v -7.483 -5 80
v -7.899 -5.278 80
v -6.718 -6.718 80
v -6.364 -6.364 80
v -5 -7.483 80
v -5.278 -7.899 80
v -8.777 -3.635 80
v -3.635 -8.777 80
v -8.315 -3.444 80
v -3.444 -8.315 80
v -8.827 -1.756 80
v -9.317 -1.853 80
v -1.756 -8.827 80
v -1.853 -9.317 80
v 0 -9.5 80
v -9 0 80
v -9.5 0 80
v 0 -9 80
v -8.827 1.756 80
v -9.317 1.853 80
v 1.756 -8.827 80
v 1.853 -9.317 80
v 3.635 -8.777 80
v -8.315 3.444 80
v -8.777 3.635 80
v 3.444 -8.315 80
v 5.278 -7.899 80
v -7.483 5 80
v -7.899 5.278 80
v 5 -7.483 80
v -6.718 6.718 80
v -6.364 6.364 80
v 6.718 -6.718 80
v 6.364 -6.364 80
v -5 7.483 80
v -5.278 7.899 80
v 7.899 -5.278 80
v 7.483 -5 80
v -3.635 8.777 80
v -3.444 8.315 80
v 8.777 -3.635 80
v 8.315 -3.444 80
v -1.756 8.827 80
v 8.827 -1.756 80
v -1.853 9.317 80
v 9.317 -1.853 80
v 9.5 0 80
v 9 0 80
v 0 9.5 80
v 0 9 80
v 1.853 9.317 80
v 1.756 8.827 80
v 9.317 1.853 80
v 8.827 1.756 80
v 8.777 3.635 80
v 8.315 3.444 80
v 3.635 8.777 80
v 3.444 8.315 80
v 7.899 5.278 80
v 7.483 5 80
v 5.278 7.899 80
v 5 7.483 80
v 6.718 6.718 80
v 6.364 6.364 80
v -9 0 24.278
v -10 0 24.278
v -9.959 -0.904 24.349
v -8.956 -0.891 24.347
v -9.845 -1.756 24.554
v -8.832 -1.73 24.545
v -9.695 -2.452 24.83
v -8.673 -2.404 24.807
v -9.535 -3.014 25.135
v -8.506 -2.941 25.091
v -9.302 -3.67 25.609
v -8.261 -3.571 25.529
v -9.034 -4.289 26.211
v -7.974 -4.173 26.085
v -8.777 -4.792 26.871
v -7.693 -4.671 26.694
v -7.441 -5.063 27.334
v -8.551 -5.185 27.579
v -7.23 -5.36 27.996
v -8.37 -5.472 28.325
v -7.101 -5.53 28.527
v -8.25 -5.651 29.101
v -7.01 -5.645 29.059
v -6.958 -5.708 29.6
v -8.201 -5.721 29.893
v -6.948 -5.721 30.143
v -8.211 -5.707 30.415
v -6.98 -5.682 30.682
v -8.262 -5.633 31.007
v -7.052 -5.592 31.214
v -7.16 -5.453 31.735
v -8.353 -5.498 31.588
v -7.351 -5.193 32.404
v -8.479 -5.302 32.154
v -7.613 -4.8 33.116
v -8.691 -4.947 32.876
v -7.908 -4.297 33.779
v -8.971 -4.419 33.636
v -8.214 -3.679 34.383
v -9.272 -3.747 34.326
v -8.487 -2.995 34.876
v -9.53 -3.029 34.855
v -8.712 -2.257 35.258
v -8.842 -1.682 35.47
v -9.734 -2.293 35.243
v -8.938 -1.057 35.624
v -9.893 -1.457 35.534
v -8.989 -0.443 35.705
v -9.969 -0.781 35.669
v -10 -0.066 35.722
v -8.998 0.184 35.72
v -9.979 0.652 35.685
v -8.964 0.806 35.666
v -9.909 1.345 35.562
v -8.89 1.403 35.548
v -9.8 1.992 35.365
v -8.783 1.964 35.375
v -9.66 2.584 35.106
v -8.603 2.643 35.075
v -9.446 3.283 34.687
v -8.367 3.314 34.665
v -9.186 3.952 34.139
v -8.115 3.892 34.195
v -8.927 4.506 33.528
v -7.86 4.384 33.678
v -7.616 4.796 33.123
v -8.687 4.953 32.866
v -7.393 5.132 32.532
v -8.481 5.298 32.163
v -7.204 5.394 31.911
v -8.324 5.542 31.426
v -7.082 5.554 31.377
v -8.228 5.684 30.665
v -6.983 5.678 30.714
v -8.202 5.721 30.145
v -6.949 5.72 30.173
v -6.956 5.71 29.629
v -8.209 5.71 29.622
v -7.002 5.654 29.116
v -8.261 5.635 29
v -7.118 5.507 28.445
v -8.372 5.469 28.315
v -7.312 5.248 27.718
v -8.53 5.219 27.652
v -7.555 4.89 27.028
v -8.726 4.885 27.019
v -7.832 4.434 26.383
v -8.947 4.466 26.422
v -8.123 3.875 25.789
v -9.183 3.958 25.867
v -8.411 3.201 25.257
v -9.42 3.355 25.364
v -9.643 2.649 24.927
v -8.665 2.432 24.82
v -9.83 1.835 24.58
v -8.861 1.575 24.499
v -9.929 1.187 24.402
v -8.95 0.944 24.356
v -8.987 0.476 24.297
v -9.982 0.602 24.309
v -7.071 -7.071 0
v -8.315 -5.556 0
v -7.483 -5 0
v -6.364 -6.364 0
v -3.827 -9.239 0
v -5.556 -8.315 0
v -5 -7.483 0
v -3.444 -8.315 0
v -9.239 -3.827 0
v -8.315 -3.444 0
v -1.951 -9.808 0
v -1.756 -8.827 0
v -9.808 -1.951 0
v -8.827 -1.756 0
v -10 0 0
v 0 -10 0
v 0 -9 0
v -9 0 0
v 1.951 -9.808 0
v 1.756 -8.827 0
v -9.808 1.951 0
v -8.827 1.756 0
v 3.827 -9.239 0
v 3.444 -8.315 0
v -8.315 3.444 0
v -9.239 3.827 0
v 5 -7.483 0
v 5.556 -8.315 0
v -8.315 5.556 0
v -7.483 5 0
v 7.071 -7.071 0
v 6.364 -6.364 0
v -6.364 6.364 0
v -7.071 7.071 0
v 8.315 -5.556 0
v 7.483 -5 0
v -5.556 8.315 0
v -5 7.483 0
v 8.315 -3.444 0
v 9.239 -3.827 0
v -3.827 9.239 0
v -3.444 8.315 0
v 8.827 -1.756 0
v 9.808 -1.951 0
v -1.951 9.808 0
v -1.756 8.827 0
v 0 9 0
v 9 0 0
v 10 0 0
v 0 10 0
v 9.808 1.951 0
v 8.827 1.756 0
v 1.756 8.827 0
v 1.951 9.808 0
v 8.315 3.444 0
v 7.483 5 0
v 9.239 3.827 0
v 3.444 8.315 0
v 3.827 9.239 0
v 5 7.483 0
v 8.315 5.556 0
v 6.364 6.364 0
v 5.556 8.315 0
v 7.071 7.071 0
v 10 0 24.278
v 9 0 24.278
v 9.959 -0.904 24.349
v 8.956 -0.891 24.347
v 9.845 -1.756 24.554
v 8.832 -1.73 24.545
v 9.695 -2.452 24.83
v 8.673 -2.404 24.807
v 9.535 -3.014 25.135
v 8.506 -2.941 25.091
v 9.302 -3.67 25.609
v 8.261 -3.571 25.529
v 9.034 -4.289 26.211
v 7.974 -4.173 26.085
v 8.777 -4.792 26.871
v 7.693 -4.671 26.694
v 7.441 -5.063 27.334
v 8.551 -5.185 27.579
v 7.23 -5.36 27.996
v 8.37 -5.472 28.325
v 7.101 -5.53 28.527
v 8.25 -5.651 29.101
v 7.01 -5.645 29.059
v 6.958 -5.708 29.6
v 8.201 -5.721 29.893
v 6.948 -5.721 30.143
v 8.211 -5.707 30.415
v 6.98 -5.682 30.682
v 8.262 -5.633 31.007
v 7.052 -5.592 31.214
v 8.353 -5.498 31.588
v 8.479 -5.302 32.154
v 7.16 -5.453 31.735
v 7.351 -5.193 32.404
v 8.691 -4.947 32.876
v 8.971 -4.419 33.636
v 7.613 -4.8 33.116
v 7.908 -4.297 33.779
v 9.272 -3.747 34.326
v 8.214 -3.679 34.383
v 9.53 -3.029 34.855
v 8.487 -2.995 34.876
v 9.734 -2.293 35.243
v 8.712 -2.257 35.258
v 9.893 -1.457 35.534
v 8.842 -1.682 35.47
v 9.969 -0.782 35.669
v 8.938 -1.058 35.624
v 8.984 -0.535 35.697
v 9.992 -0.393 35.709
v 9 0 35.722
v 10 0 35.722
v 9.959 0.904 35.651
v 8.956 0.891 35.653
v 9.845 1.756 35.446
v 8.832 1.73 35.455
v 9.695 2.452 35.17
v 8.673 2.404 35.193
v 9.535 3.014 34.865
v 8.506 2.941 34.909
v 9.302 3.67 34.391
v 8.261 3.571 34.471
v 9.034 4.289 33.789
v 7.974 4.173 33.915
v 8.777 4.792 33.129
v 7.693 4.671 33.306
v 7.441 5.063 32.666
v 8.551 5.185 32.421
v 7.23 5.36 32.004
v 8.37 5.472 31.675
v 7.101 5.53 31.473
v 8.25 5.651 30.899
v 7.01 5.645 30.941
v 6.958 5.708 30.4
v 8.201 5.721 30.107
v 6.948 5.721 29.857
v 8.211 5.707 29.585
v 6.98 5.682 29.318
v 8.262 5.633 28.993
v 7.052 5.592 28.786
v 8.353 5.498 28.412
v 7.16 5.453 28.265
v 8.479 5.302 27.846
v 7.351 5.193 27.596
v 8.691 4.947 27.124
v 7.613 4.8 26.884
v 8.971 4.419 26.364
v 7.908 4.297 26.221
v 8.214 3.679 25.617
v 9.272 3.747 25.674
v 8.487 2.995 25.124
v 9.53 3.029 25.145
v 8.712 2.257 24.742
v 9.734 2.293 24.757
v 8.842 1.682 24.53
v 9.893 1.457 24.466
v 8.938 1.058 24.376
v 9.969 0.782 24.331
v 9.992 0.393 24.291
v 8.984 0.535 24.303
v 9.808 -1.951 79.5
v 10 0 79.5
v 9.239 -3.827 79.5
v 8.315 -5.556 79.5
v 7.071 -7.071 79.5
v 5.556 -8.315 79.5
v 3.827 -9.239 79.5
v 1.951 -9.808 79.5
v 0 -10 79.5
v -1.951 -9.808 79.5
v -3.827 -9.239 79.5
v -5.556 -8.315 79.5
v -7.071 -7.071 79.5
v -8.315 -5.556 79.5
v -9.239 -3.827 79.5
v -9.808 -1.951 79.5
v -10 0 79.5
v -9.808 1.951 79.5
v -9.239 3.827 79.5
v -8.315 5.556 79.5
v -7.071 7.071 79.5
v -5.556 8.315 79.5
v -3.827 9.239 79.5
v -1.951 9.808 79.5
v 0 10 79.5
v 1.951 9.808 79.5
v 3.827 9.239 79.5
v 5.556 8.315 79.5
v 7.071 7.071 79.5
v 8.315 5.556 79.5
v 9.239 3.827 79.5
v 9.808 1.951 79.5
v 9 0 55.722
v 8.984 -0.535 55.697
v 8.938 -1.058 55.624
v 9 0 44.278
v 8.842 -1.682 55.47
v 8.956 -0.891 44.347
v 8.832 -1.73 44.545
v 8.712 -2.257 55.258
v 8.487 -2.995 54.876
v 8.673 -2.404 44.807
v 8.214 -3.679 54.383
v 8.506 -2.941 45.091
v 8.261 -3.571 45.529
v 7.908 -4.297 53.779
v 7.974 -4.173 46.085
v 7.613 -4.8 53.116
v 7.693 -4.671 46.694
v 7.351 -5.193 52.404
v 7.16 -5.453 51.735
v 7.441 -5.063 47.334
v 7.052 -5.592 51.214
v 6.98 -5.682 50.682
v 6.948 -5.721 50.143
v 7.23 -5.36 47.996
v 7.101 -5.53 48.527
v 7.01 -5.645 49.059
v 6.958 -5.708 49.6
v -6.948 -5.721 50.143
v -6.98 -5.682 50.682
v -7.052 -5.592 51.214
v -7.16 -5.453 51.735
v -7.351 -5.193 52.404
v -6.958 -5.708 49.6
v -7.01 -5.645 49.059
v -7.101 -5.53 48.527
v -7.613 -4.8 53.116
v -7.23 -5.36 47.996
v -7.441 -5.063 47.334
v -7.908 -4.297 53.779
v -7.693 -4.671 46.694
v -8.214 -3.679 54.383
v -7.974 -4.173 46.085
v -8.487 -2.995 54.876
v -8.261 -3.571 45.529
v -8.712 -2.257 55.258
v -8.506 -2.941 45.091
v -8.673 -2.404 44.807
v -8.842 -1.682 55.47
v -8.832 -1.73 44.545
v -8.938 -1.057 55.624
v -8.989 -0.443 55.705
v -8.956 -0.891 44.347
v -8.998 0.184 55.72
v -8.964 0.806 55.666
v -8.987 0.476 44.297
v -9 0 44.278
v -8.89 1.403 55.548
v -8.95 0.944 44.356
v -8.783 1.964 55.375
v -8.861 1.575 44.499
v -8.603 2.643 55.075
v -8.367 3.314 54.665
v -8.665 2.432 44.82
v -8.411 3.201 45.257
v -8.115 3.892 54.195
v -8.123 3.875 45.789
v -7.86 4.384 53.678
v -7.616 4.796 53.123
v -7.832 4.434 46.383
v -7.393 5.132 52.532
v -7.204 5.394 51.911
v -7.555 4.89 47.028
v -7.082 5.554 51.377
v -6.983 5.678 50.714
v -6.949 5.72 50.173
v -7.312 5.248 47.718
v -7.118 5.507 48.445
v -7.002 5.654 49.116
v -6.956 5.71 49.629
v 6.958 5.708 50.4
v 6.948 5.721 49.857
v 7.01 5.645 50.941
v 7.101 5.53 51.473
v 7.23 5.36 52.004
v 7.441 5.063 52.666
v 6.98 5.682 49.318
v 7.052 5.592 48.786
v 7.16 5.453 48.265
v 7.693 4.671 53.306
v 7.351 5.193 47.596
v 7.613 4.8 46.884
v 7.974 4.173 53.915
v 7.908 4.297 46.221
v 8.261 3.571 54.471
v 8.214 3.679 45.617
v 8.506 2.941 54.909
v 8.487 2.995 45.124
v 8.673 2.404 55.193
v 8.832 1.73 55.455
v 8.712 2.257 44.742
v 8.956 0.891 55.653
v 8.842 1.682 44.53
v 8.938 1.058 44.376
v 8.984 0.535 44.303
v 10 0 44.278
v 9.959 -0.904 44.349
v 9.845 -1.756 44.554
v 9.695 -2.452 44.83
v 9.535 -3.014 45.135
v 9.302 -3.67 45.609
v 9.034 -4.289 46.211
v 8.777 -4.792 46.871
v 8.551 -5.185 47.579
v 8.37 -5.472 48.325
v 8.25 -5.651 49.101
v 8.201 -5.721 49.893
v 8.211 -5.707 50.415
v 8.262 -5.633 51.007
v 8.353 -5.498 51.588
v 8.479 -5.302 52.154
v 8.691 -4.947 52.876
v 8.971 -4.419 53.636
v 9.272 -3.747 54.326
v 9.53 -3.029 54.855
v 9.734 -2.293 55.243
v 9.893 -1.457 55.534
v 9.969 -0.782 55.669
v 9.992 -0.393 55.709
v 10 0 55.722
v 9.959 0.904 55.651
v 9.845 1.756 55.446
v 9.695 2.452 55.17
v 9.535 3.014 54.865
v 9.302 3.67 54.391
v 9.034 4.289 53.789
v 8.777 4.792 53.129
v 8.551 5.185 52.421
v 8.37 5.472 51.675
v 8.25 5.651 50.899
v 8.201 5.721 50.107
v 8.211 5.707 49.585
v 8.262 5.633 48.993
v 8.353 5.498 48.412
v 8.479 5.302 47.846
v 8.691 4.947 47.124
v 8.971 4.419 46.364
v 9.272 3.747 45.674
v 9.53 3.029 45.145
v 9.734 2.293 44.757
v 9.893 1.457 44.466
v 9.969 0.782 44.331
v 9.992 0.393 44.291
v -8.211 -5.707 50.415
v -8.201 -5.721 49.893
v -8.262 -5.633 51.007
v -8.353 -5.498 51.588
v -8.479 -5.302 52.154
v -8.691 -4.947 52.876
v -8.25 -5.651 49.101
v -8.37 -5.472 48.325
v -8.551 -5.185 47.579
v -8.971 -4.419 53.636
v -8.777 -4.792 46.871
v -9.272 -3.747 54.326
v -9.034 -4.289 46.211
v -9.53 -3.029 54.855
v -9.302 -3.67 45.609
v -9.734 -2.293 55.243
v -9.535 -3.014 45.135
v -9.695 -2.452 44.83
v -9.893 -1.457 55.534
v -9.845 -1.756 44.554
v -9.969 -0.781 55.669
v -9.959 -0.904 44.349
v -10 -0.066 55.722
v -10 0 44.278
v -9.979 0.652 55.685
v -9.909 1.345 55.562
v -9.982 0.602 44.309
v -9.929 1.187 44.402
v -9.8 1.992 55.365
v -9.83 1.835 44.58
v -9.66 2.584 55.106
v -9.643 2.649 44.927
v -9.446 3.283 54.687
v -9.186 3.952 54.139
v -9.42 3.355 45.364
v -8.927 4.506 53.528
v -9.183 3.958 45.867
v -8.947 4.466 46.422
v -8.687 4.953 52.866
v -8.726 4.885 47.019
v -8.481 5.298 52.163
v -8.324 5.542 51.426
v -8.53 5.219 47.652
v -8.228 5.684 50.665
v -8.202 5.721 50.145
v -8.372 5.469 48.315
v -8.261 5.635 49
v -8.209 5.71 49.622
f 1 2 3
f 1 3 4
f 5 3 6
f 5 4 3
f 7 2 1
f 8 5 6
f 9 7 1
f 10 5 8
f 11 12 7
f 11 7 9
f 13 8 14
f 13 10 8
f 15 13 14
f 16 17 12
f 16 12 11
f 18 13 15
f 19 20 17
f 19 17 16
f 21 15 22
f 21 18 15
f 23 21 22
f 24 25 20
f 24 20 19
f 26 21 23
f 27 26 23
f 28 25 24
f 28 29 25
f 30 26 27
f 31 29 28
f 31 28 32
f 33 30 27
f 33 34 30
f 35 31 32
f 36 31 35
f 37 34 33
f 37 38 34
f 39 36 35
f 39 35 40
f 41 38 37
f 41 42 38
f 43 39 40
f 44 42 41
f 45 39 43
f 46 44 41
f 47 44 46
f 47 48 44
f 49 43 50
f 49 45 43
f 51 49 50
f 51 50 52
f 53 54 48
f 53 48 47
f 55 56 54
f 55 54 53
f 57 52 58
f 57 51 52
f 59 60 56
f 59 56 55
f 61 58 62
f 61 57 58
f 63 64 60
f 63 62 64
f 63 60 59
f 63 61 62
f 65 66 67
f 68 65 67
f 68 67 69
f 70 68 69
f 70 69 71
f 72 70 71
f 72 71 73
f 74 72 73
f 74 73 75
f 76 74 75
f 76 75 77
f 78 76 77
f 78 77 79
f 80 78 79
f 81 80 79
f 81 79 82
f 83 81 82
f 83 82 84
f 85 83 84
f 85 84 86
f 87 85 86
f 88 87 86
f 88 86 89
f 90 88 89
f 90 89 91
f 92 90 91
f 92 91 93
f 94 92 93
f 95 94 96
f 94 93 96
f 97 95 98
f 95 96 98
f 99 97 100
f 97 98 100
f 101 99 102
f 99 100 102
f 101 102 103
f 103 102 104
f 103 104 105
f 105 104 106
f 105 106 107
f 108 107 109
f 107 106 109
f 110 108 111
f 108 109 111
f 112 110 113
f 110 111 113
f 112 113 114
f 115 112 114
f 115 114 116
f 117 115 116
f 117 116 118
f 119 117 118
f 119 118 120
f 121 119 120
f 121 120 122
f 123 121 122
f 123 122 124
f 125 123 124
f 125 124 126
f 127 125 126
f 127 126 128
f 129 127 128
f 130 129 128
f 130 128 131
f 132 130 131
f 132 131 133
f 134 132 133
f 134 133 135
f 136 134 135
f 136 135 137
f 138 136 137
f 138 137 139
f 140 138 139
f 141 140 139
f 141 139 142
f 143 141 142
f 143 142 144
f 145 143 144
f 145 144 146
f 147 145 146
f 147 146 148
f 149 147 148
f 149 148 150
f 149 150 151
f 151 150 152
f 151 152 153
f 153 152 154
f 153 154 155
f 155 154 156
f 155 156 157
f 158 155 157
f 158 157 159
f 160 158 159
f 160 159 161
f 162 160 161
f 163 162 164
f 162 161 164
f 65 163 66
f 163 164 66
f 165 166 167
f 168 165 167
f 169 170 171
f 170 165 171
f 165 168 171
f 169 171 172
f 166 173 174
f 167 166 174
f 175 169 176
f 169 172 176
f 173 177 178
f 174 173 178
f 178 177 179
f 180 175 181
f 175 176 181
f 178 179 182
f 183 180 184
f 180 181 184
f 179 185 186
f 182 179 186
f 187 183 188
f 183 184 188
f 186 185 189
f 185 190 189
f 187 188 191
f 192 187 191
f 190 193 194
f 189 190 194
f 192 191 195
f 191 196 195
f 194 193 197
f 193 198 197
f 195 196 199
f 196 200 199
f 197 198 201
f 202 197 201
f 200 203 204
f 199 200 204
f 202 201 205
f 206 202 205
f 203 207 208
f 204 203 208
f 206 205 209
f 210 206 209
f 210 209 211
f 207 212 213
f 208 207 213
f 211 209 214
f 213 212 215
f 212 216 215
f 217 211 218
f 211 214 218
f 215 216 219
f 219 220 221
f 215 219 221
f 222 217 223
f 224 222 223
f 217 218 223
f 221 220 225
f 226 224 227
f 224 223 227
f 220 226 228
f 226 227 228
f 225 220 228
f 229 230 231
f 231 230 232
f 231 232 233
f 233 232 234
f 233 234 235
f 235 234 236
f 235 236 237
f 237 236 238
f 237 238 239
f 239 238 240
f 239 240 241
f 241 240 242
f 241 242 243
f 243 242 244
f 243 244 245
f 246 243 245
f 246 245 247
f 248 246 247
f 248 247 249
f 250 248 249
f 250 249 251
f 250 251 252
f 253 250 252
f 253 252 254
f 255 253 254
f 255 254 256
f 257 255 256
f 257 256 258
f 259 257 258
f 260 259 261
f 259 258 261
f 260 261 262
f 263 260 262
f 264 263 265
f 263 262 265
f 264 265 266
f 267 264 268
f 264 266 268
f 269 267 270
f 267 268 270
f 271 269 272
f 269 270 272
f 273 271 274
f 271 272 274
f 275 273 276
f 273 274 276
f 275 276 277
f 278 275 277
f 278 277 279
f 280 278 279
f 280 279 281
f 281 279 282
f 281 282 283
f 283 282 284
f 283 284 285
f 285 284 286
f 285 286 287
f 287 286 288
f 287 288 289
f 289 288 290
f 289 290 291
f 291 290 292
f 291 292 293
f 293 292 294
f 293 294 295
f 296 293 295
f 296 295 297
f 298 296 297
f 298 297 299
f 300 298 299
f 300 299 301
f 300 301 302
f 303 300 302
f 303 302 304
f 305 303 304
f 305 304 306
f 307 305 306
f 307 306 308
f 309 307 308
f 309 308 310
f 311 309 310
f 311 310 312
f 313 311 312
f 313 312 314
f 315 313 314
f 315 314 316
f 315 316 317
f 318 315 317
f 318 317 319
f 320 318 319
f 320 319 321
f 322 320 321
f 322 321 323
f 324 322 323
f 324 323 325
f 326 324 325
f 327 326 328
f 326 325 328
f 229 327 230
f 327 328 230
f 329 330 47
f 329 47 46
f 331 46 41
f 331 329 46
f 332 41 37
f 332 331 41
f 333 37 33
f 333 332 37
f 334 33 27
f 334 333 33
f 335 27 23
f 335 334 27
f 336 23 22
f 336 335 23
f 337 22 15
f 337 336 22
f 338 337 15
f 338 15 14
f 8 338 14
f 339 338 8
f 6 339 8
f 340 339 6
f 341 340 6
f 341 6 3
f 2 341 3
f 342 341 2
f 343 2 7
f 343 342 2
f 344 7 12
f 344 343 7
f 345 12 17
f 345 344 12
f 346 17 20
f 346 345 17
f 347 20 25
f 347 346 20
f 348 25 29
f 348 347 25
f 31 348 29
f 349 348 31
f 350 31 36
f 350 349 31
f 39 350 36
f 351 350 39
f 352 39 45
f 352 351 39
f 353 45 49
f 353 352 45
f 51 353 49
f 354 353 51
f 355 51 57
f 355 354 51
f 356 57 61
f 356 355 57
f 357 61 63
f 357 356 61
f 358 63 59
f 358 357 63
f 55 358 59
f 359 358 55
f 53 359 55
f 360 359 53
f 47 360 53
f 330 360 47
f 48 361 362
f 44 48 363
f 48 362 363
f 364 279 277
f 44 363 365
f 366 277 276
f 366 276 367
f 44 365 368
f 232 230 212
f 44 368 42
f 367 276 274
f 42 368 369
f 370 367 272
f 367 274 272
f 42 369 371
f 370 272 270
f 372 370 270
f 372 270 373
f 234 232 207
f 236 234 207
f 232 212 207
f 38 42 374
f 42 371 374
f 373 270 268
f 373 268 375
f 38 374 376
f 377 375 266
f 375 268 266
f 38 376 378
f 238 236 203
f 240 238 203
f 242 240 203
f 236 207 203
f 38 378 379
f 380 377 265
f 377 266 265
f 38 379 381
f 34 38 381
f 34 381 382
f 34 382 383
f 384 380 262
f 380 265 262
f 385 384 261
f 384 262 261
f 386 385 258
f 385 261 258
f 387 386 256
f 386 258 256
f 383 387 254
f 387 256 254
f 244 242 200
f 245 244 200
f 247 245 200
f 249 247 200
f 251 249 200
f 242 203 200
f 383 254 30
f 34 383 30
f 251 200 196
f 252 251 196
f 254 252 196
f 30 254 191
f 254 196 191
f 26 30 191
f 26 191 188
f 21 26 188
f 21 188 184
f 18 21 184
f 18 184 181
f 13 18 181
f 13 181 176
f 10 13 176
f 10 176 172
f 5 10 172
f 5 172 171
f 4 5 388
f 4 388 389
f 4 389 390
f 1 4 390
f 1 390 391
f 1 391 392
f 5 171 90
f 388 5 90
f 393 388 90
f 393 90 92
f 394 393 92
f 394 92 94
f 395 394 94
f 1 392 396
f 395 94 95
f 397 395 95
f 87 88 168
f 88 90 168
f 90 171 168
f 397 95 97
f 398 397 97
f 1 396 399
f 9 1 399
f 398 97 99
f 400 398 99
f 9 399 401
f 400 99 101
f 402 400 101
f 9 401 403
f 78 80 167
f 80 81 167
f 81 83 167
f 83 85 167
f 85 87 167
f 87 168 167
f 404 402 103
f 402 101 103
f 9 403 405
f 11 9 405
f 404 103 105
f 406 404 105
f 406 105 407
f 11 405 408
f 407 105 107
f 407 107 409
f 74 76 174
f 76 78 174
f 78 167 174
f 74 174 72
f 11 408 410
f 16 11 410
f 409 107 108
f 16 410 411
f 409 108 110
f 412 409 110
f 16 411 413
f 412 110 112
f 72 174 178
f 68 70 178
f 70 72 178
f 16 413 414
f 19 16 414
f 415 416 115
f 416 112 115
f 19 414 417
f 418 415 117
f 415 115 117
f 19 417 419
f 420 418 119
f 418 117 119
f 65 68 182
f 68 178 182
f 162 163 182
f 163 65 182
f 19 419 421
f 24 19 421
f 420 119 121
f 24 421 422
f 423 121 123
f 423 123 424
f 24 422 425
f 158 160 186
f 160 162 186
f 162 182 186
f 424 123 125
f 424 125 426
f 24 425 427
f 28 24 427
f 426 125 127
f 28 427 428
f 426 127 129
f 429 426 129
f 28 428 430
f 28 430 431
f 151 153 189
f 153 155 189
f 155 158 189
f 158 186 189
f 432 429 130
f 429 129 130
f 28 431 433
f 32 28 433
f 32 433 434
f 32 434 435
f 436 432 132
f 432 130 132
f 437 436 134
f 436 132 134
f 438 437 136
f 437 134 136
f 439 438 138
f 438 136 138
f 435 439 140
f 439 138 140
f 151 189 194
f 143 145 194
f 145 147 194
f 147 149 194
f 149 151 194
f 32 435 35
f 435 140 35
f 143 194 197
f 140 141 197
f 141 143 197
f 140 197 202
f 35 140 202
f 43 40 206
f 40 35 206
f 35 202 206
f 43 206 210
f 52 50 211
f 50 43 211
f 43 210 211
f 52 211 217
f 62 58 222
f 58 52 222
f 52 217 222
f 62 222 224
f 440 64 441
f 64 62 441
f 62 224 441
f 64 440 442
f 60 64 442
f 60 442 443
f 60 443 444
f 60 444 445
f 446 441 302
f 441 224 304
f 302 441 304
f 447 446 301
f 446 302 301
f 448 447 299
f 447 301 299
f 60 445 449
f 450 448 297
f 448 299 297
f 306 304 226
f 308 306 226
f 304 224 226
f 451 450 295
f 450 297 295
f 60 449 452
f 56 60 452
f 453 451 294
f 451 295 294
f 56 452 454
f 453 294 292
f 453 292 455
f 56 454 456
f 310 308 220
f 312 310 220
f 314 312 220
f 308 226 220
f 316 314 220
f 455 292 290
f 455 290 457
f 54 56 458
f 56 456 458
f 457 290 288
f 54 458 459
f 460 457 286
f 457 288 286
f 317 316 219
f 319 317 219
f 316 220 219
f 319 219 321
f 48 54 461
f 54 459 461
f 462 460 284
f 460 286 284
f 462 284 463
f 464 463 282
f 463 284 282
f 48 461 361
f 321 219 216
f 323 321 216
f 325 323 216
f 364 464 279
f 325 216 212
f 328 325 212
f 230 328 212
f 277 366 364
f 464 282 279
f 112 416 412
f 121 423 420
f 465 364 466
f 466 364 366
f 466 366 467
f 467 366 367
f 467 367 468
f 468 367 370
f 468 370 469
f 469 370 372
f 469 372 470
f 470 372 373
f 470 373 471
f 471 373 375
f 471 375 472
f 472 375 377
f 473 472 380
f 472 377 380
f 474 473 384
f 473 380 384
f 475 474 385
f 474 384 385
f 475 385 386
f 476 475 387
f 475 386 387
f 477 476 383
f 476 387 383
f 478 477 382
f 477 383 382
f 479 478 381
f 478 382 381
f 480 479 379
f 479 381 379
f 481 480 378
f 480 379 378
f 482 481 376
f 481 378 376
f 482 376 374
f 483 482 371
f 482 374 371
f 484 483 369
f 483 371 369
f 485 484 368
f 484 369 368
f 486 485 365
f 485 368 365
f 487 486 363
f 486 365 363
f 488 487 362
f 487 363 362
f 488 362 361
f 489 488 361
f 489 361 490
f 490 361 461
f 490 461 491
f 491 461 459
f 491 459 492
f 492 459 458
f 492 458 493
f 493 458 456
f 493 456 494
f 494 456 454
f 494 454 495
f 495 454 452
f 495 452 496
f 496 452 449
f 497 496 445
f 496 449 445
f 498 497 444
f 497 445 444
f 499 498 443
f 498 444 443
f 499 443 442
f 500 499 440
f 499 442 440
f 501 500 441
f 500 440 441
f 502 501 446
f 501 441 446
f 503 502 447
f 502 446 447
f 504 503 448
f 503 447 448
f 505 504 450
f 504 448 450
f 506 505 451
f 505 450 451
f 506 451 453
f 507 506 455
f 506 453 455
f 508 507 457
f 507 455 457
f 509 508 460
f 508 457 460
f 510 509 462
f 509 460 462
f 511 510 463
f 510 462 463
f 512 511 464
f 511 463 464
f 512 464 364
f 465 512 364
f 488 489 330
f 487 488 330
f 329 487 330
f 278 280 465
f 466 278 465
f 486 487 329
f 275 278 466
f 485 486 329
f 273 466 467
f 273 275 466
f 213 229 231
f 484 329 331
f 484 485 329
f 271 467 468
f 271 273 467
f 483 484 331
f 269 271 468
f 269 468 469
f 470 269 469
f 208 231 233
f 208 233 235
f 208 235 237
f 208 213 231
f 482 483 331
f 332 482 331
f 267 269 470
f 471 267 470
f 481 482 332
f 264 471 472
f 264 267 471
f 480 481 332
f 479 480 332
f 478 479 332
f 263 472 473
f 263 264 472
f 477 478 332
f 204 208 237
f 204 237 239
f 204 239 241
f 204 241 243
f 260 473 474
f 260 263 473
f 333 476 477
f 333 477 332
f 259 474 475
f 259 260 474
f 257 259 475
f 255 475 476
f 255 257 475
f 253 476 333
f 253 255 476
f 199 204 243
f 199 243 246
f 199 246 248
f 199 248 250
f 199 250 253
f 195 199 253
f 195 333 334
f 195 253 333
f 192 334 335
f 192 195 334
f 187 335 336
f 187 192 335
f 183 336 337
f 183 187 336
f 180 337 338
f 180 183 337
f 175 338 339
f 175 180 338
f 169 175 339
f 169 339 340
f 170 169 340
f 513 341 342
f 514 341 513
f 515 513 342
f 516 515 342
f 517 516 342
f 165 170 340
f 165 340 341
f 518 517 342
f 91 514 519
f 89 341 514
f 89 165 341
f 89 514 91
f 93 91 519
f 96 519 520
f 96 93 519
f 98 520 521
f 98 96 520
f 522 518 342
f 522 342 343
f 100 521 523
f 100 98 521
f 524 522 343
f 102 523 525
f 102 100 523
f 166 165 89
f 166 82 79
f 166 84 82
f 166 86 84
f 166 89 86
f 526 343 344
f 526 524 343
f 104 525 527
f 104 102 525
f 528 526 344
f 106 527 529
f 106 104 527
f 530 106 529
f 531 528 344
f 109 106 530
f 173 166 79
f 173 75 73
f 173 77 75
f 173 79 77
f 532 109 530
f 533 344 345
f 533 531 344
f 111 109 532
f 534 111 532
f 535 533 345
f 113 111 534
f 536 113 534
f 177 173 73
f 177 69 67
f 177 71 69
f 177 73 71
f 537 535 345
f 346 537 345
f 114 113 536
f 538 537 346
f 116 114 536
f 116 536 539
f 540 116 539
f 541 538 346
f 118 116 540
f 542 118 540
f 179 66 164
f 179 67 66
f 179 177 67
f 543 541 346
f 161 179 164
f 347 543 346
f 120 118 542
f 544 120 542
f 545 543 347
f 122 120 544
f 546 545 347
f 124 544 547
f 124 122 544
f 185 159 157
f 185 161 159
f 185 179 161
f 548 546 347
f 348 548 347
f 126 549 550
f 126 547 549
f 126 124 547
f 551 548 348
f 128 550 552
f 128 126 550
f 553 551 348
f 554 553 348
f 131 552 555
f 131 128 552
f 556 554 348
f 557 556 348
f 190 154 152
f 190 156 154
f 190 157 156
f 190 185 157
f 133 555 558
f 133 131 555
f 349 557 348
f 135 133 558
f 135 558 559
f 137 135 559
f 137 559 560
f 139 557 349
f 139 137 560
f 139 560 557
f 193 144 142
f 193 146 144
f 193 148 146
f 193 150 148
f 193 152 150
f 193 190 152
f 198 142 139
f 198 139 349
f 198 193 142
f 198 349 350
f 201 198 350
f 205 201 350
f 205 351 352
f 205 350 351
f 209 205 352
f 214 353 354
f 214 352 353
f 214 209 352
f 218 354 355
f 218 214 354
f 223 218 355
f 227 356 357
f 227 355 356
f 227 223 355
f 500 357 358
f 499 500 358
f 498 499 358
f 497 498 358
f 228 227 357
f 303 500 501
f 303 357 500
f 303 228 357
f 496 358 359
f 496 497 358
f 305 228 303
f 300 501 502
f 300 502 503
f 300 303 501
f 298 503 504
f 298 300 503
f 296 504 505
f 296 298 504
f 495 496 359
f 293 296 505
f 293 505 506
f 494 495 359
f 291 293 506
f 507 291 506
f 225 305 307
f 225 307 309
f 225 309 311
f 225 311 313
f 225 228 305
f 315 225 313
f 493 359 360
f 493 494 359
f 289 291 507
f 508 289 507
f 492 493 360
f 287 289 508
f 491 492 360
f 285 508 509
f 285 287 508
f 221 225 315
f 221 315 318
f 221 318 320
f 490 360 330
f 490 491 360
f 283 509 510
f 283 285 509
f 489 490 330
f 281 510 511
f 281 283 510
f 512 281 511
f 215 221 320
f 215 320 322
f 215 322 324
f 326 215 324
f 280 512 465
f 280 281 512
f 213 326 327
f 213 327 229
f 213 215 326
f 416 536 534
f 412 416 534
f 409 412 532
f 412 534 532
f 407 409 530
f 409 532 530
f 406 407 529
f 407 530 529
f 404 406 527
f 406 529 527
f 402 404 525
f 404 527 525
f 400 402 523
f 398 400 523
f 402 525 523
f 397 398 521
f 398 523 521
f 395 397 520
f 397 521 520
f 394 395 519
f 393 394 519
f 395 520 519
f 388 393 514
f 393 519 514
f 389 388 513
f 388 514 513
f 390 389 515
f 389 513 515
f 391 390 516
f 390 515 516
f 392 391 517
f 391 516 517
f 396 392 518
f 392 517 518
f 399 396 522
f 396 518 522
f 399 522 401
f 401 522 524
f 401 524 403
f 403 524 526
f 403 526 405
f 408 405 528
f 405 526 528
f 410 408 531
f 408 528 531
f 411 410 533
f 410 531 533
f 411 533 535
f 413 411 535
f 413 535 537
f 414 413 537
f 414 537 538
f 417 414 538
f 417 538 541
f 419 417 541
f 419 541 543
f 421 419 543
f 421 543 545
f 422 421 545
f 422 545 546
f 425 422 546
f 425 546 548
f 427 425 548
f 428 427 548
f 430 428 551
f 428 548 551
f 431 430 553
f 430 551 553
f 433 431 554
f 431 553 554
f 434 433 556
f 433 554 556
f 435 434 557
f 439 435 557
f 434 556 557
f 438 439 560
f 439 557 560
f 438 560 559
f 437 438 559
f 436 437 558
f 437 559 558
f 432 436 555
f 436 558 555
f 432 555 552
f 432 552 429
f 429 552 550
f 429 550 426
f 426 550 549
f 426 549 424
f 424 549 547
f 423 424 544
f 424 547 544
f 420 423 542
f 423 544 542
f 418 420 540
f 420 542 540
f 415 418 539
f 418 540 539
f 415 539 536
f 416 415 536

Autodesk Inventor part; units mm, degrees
ref_plane "XZ Plane" through (0, 0, 0) normal (0, 1, 0) x (-1, 0, 0)
ref_plane "XY Plane" through (0, 0, 0) normal (0, 0, 1) x (1, 0, 0)
sketch "Skizze1" plane through (0, 0, 0) normal (0, 0, 1) x (1, 0, 0)
  line L0 (-14, 0) -> (14, 0) projected
  line L1 (0, -14) -> (0, 14) projected
  circle A0 centre (0, 0) radius 10
  circle A1 centre (0, 0) radius 9
  dimension "d0" = 20
  dimension "d1" = 18
extrude "Extrusion1" add sketch "Skizze1" along normal blind 80 contours A1 L1 A0 L0 | L0 A0 L1 A1 | A1 L0 A0 L1 | L1 A0 L0 A1
thread "Gewinde1" size "M20x2.5" class "6g" standard "ANSI Metric M Profile" length 15
thread "Gewinde2" size "M20x2.5" class "6g" standard "ANSI Metric M Profile" length 15
chamfer "Fase1" distance 0.5 angle 45 1 edges at (-10, 0, 80)
ref_plane "Arbeitsebene1" through (10, 0, 0) normal (1, 0, 0) x (0, 1, 0)
sketch "Skizze2" plane through (10, 0, 0) normal (1, 0, 0) x (0, 1, 0)
  line L0 (-9.5, 80) -> (9.5, 80) projected
  point P0 (0, 0)
  point P1 (0, 50)
  point P2 (0, 30)
  dimension "d12" = 30
  dimension "d13" = 30
hole "Bohrung1" at (10, 0, 50) at (10, 0, 30) direction (-1, 0, 0) diameter 11.445 end through all thread size "G13.157x1.337" designation "G 1/4" standard "ISO Pipe Threads"
properties part number "Wasserverteiler1"
